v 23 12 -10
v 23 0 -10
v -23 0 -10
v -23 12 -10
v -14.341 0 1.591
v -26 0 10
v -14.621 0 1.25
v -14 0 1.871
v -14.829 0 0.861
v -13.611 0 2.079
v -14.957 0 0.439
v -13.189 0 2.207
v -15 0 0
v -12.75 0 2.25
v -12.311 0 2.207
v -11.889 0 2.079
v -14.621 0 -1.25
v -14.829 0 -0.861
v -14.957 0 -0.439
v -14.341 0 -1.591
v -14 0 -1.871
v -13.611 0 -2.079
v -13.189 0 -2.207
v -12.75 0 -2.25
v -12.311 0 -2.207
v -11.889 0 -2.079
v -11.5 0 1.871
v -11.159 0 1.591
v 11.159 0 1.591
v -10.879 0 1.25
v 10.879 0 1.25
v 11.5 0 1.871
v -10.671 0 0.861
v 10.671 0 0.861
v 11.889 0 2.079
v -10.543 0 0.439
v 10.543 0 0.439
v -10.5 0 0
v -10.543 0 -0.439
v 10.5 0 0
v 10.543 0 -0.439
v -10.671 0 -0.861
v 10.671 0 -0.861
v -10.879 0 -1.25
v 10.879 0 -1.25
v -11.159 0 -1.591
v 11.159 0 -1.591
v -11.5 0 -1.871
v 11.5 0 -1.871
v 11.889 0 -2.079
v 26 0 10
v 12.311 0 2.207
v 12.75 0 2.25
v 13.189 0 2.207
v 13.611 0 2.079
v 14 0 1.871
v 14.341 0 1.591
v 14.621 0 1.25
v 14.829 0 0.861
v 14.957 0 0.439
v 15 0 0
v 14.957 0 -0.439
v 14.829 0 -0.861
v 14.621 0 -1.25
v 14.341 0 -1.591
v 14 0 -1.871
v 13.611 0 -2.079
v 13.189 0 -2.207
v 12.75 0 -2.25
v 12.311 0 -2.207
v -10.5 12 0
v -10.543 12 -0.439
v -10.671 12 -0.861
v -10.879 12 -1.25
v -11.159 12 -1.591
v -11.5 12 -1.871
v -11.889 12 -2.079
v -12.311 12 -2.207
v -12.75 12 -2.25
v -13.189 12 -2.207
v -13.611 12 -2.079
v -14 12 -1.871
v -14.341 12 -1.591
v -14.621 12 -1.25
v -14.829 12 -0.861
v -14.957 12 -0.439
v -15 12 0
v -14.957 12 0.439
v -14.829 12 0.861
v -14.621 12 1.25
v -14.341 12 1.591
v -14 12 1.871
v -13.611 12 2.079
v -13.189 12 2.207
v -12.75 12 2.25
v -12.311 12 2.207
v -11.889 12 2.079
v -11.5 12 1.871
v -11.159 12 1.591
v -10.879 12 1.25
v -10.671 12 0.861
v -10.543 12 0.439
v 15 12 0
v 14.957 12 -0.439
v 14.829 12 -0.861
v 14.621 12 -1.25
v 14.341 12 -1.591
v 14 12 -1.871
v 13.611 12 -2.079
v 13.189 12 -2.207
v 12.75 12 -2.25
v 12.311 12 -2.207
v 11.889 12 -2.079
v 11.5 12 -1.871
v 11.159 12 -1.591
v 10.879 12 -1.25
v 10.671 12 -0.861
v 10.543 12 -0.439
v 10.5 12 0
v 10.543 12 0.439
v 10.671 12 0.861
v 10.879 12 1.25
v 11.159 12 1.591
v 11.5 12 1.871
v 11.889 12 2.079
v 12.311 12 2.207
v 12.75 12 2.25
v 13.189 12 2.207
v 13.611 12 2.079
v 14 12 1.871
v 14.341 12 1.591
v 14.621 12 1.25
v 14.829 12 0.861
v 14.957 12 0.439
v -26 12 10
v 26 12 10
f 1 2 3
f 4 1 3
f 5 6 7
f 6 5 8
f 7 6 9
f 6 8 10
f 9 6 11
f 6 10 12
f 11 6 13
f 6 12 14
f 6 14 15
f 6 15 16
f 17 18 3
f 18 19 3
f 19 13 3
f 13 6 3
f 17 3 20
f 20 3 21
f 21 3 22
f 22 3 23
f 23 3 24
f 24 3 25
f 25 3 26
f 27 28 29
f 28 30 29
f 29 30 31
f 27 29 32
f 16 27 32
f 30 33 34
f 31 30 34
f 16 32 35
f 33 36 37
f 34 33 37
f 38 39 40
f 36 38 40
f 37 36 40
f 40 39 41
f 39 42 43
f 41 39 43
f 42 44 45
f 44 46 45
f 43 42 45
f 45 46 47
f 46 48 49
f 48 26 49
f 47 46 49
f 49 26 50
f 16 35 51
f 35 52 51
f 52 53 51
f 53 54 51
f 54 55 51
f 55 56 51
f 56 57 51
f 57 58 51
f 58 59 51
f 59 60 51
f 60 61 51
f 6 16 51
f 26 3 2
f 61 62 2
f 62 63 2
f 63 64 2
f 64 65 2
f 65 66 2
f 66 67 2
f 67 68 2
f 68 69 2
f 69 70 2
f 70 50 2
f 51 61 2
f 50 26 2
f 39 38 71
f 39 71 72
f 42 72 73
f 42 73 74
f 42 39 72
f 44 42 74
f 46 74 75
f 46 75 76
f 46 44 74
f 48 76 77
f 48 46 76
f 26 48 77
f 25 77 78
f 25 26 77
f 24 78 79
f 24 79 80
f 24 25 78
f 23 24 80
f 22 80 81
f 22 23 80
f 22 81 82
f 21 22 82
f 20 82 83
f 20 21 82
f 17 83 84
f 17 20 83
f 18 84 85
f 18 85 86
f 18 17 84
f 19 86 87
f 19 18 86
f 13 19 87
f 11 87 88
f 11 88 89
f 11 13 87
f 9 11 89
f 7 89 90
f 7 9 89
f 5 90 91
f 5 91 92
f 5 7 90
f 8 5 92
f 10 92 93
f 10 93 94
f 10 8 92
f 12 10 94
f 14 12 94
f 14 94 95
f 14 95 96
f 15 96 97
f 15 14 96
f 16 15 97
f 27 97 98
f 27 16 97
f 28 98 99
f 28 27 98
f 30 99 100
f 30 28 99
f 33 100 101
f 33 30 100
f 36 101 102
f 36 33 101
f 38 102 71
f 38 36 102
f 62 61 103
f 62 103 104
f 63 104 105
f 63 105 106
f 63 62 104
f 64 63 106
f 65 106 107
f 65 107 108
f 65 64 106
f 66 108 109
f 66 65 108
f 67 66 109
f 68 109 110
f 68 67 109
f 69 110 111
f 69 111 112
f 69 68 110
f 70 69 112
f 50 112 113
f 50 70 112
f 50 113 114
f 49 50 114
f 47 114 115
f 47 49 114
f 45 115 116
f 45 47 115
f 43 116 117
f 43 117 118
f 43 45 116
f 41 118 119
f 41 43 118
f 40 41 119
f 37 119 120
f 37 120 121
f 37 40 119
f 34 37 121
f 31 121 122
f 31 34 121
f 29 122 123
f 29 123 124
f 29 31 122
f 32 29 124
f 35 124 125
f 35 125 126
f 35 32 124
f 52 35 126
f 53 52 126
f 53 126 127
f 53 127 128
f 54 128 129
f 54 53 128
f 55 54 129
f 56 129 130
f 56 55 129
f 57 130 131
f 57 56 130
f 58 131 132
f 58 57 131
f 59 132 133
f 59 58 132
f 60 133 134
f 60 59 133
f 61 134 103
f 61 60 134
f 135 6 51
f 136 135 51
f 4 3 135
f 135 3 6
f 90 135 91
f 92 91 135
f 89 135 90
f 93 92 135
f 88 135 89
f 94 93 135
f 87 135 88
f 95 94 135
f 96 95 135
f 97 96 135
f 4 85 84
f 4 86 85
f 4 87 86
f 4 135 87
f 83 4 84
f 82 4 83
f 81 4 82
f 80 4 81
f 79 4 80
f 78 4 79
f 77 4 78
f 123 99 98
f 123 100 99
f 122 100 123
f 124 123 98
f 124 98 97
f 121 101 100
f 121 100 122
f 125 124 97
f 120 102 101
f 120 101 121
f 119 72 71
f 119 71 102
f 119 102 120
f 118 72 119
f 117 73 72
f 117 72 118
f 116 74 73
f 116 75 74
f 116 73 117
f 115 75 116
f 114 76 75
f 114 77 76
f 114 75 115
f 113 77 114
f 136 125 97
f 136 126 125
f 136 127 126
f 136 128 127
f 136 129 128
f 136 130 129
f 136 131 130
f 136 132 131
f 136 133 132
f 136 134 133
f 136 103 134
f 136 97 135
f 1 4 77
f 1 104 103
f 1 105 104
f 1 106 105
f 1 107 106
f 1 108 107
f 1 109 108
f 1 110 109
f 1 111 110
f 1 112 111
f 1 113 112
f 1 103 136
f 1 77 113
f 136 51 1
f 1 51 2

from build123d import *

# Parameters (mm, degrees)
SKETCH1_R           = 2.25
BOSS_EXTRUDE1_DEPTH = 12


with BuildPart() as part:
    # Sketch1 → Boss-Extrude1 (new body)
    with BuildSketch(Plane(origin=(0, 0, 0), x_dir=(1, 0, 0), z_dir=(0, 1, 0))):
        Polygon((-23, 10), (-26, -10), (26, -10), (23, 10), align=None)
        with Locations((-12.75, 0)):
            Circle(SKETCH1_R, mode=Mode.SUBTRACT)
        with Locations((12.75, 0)):
            Circle(SKETCH1_R, mode=Mode.SUBTRACT)
    extrude(amount=BOSS_EXTRUDE1_DEPTH)


solid = part.part
